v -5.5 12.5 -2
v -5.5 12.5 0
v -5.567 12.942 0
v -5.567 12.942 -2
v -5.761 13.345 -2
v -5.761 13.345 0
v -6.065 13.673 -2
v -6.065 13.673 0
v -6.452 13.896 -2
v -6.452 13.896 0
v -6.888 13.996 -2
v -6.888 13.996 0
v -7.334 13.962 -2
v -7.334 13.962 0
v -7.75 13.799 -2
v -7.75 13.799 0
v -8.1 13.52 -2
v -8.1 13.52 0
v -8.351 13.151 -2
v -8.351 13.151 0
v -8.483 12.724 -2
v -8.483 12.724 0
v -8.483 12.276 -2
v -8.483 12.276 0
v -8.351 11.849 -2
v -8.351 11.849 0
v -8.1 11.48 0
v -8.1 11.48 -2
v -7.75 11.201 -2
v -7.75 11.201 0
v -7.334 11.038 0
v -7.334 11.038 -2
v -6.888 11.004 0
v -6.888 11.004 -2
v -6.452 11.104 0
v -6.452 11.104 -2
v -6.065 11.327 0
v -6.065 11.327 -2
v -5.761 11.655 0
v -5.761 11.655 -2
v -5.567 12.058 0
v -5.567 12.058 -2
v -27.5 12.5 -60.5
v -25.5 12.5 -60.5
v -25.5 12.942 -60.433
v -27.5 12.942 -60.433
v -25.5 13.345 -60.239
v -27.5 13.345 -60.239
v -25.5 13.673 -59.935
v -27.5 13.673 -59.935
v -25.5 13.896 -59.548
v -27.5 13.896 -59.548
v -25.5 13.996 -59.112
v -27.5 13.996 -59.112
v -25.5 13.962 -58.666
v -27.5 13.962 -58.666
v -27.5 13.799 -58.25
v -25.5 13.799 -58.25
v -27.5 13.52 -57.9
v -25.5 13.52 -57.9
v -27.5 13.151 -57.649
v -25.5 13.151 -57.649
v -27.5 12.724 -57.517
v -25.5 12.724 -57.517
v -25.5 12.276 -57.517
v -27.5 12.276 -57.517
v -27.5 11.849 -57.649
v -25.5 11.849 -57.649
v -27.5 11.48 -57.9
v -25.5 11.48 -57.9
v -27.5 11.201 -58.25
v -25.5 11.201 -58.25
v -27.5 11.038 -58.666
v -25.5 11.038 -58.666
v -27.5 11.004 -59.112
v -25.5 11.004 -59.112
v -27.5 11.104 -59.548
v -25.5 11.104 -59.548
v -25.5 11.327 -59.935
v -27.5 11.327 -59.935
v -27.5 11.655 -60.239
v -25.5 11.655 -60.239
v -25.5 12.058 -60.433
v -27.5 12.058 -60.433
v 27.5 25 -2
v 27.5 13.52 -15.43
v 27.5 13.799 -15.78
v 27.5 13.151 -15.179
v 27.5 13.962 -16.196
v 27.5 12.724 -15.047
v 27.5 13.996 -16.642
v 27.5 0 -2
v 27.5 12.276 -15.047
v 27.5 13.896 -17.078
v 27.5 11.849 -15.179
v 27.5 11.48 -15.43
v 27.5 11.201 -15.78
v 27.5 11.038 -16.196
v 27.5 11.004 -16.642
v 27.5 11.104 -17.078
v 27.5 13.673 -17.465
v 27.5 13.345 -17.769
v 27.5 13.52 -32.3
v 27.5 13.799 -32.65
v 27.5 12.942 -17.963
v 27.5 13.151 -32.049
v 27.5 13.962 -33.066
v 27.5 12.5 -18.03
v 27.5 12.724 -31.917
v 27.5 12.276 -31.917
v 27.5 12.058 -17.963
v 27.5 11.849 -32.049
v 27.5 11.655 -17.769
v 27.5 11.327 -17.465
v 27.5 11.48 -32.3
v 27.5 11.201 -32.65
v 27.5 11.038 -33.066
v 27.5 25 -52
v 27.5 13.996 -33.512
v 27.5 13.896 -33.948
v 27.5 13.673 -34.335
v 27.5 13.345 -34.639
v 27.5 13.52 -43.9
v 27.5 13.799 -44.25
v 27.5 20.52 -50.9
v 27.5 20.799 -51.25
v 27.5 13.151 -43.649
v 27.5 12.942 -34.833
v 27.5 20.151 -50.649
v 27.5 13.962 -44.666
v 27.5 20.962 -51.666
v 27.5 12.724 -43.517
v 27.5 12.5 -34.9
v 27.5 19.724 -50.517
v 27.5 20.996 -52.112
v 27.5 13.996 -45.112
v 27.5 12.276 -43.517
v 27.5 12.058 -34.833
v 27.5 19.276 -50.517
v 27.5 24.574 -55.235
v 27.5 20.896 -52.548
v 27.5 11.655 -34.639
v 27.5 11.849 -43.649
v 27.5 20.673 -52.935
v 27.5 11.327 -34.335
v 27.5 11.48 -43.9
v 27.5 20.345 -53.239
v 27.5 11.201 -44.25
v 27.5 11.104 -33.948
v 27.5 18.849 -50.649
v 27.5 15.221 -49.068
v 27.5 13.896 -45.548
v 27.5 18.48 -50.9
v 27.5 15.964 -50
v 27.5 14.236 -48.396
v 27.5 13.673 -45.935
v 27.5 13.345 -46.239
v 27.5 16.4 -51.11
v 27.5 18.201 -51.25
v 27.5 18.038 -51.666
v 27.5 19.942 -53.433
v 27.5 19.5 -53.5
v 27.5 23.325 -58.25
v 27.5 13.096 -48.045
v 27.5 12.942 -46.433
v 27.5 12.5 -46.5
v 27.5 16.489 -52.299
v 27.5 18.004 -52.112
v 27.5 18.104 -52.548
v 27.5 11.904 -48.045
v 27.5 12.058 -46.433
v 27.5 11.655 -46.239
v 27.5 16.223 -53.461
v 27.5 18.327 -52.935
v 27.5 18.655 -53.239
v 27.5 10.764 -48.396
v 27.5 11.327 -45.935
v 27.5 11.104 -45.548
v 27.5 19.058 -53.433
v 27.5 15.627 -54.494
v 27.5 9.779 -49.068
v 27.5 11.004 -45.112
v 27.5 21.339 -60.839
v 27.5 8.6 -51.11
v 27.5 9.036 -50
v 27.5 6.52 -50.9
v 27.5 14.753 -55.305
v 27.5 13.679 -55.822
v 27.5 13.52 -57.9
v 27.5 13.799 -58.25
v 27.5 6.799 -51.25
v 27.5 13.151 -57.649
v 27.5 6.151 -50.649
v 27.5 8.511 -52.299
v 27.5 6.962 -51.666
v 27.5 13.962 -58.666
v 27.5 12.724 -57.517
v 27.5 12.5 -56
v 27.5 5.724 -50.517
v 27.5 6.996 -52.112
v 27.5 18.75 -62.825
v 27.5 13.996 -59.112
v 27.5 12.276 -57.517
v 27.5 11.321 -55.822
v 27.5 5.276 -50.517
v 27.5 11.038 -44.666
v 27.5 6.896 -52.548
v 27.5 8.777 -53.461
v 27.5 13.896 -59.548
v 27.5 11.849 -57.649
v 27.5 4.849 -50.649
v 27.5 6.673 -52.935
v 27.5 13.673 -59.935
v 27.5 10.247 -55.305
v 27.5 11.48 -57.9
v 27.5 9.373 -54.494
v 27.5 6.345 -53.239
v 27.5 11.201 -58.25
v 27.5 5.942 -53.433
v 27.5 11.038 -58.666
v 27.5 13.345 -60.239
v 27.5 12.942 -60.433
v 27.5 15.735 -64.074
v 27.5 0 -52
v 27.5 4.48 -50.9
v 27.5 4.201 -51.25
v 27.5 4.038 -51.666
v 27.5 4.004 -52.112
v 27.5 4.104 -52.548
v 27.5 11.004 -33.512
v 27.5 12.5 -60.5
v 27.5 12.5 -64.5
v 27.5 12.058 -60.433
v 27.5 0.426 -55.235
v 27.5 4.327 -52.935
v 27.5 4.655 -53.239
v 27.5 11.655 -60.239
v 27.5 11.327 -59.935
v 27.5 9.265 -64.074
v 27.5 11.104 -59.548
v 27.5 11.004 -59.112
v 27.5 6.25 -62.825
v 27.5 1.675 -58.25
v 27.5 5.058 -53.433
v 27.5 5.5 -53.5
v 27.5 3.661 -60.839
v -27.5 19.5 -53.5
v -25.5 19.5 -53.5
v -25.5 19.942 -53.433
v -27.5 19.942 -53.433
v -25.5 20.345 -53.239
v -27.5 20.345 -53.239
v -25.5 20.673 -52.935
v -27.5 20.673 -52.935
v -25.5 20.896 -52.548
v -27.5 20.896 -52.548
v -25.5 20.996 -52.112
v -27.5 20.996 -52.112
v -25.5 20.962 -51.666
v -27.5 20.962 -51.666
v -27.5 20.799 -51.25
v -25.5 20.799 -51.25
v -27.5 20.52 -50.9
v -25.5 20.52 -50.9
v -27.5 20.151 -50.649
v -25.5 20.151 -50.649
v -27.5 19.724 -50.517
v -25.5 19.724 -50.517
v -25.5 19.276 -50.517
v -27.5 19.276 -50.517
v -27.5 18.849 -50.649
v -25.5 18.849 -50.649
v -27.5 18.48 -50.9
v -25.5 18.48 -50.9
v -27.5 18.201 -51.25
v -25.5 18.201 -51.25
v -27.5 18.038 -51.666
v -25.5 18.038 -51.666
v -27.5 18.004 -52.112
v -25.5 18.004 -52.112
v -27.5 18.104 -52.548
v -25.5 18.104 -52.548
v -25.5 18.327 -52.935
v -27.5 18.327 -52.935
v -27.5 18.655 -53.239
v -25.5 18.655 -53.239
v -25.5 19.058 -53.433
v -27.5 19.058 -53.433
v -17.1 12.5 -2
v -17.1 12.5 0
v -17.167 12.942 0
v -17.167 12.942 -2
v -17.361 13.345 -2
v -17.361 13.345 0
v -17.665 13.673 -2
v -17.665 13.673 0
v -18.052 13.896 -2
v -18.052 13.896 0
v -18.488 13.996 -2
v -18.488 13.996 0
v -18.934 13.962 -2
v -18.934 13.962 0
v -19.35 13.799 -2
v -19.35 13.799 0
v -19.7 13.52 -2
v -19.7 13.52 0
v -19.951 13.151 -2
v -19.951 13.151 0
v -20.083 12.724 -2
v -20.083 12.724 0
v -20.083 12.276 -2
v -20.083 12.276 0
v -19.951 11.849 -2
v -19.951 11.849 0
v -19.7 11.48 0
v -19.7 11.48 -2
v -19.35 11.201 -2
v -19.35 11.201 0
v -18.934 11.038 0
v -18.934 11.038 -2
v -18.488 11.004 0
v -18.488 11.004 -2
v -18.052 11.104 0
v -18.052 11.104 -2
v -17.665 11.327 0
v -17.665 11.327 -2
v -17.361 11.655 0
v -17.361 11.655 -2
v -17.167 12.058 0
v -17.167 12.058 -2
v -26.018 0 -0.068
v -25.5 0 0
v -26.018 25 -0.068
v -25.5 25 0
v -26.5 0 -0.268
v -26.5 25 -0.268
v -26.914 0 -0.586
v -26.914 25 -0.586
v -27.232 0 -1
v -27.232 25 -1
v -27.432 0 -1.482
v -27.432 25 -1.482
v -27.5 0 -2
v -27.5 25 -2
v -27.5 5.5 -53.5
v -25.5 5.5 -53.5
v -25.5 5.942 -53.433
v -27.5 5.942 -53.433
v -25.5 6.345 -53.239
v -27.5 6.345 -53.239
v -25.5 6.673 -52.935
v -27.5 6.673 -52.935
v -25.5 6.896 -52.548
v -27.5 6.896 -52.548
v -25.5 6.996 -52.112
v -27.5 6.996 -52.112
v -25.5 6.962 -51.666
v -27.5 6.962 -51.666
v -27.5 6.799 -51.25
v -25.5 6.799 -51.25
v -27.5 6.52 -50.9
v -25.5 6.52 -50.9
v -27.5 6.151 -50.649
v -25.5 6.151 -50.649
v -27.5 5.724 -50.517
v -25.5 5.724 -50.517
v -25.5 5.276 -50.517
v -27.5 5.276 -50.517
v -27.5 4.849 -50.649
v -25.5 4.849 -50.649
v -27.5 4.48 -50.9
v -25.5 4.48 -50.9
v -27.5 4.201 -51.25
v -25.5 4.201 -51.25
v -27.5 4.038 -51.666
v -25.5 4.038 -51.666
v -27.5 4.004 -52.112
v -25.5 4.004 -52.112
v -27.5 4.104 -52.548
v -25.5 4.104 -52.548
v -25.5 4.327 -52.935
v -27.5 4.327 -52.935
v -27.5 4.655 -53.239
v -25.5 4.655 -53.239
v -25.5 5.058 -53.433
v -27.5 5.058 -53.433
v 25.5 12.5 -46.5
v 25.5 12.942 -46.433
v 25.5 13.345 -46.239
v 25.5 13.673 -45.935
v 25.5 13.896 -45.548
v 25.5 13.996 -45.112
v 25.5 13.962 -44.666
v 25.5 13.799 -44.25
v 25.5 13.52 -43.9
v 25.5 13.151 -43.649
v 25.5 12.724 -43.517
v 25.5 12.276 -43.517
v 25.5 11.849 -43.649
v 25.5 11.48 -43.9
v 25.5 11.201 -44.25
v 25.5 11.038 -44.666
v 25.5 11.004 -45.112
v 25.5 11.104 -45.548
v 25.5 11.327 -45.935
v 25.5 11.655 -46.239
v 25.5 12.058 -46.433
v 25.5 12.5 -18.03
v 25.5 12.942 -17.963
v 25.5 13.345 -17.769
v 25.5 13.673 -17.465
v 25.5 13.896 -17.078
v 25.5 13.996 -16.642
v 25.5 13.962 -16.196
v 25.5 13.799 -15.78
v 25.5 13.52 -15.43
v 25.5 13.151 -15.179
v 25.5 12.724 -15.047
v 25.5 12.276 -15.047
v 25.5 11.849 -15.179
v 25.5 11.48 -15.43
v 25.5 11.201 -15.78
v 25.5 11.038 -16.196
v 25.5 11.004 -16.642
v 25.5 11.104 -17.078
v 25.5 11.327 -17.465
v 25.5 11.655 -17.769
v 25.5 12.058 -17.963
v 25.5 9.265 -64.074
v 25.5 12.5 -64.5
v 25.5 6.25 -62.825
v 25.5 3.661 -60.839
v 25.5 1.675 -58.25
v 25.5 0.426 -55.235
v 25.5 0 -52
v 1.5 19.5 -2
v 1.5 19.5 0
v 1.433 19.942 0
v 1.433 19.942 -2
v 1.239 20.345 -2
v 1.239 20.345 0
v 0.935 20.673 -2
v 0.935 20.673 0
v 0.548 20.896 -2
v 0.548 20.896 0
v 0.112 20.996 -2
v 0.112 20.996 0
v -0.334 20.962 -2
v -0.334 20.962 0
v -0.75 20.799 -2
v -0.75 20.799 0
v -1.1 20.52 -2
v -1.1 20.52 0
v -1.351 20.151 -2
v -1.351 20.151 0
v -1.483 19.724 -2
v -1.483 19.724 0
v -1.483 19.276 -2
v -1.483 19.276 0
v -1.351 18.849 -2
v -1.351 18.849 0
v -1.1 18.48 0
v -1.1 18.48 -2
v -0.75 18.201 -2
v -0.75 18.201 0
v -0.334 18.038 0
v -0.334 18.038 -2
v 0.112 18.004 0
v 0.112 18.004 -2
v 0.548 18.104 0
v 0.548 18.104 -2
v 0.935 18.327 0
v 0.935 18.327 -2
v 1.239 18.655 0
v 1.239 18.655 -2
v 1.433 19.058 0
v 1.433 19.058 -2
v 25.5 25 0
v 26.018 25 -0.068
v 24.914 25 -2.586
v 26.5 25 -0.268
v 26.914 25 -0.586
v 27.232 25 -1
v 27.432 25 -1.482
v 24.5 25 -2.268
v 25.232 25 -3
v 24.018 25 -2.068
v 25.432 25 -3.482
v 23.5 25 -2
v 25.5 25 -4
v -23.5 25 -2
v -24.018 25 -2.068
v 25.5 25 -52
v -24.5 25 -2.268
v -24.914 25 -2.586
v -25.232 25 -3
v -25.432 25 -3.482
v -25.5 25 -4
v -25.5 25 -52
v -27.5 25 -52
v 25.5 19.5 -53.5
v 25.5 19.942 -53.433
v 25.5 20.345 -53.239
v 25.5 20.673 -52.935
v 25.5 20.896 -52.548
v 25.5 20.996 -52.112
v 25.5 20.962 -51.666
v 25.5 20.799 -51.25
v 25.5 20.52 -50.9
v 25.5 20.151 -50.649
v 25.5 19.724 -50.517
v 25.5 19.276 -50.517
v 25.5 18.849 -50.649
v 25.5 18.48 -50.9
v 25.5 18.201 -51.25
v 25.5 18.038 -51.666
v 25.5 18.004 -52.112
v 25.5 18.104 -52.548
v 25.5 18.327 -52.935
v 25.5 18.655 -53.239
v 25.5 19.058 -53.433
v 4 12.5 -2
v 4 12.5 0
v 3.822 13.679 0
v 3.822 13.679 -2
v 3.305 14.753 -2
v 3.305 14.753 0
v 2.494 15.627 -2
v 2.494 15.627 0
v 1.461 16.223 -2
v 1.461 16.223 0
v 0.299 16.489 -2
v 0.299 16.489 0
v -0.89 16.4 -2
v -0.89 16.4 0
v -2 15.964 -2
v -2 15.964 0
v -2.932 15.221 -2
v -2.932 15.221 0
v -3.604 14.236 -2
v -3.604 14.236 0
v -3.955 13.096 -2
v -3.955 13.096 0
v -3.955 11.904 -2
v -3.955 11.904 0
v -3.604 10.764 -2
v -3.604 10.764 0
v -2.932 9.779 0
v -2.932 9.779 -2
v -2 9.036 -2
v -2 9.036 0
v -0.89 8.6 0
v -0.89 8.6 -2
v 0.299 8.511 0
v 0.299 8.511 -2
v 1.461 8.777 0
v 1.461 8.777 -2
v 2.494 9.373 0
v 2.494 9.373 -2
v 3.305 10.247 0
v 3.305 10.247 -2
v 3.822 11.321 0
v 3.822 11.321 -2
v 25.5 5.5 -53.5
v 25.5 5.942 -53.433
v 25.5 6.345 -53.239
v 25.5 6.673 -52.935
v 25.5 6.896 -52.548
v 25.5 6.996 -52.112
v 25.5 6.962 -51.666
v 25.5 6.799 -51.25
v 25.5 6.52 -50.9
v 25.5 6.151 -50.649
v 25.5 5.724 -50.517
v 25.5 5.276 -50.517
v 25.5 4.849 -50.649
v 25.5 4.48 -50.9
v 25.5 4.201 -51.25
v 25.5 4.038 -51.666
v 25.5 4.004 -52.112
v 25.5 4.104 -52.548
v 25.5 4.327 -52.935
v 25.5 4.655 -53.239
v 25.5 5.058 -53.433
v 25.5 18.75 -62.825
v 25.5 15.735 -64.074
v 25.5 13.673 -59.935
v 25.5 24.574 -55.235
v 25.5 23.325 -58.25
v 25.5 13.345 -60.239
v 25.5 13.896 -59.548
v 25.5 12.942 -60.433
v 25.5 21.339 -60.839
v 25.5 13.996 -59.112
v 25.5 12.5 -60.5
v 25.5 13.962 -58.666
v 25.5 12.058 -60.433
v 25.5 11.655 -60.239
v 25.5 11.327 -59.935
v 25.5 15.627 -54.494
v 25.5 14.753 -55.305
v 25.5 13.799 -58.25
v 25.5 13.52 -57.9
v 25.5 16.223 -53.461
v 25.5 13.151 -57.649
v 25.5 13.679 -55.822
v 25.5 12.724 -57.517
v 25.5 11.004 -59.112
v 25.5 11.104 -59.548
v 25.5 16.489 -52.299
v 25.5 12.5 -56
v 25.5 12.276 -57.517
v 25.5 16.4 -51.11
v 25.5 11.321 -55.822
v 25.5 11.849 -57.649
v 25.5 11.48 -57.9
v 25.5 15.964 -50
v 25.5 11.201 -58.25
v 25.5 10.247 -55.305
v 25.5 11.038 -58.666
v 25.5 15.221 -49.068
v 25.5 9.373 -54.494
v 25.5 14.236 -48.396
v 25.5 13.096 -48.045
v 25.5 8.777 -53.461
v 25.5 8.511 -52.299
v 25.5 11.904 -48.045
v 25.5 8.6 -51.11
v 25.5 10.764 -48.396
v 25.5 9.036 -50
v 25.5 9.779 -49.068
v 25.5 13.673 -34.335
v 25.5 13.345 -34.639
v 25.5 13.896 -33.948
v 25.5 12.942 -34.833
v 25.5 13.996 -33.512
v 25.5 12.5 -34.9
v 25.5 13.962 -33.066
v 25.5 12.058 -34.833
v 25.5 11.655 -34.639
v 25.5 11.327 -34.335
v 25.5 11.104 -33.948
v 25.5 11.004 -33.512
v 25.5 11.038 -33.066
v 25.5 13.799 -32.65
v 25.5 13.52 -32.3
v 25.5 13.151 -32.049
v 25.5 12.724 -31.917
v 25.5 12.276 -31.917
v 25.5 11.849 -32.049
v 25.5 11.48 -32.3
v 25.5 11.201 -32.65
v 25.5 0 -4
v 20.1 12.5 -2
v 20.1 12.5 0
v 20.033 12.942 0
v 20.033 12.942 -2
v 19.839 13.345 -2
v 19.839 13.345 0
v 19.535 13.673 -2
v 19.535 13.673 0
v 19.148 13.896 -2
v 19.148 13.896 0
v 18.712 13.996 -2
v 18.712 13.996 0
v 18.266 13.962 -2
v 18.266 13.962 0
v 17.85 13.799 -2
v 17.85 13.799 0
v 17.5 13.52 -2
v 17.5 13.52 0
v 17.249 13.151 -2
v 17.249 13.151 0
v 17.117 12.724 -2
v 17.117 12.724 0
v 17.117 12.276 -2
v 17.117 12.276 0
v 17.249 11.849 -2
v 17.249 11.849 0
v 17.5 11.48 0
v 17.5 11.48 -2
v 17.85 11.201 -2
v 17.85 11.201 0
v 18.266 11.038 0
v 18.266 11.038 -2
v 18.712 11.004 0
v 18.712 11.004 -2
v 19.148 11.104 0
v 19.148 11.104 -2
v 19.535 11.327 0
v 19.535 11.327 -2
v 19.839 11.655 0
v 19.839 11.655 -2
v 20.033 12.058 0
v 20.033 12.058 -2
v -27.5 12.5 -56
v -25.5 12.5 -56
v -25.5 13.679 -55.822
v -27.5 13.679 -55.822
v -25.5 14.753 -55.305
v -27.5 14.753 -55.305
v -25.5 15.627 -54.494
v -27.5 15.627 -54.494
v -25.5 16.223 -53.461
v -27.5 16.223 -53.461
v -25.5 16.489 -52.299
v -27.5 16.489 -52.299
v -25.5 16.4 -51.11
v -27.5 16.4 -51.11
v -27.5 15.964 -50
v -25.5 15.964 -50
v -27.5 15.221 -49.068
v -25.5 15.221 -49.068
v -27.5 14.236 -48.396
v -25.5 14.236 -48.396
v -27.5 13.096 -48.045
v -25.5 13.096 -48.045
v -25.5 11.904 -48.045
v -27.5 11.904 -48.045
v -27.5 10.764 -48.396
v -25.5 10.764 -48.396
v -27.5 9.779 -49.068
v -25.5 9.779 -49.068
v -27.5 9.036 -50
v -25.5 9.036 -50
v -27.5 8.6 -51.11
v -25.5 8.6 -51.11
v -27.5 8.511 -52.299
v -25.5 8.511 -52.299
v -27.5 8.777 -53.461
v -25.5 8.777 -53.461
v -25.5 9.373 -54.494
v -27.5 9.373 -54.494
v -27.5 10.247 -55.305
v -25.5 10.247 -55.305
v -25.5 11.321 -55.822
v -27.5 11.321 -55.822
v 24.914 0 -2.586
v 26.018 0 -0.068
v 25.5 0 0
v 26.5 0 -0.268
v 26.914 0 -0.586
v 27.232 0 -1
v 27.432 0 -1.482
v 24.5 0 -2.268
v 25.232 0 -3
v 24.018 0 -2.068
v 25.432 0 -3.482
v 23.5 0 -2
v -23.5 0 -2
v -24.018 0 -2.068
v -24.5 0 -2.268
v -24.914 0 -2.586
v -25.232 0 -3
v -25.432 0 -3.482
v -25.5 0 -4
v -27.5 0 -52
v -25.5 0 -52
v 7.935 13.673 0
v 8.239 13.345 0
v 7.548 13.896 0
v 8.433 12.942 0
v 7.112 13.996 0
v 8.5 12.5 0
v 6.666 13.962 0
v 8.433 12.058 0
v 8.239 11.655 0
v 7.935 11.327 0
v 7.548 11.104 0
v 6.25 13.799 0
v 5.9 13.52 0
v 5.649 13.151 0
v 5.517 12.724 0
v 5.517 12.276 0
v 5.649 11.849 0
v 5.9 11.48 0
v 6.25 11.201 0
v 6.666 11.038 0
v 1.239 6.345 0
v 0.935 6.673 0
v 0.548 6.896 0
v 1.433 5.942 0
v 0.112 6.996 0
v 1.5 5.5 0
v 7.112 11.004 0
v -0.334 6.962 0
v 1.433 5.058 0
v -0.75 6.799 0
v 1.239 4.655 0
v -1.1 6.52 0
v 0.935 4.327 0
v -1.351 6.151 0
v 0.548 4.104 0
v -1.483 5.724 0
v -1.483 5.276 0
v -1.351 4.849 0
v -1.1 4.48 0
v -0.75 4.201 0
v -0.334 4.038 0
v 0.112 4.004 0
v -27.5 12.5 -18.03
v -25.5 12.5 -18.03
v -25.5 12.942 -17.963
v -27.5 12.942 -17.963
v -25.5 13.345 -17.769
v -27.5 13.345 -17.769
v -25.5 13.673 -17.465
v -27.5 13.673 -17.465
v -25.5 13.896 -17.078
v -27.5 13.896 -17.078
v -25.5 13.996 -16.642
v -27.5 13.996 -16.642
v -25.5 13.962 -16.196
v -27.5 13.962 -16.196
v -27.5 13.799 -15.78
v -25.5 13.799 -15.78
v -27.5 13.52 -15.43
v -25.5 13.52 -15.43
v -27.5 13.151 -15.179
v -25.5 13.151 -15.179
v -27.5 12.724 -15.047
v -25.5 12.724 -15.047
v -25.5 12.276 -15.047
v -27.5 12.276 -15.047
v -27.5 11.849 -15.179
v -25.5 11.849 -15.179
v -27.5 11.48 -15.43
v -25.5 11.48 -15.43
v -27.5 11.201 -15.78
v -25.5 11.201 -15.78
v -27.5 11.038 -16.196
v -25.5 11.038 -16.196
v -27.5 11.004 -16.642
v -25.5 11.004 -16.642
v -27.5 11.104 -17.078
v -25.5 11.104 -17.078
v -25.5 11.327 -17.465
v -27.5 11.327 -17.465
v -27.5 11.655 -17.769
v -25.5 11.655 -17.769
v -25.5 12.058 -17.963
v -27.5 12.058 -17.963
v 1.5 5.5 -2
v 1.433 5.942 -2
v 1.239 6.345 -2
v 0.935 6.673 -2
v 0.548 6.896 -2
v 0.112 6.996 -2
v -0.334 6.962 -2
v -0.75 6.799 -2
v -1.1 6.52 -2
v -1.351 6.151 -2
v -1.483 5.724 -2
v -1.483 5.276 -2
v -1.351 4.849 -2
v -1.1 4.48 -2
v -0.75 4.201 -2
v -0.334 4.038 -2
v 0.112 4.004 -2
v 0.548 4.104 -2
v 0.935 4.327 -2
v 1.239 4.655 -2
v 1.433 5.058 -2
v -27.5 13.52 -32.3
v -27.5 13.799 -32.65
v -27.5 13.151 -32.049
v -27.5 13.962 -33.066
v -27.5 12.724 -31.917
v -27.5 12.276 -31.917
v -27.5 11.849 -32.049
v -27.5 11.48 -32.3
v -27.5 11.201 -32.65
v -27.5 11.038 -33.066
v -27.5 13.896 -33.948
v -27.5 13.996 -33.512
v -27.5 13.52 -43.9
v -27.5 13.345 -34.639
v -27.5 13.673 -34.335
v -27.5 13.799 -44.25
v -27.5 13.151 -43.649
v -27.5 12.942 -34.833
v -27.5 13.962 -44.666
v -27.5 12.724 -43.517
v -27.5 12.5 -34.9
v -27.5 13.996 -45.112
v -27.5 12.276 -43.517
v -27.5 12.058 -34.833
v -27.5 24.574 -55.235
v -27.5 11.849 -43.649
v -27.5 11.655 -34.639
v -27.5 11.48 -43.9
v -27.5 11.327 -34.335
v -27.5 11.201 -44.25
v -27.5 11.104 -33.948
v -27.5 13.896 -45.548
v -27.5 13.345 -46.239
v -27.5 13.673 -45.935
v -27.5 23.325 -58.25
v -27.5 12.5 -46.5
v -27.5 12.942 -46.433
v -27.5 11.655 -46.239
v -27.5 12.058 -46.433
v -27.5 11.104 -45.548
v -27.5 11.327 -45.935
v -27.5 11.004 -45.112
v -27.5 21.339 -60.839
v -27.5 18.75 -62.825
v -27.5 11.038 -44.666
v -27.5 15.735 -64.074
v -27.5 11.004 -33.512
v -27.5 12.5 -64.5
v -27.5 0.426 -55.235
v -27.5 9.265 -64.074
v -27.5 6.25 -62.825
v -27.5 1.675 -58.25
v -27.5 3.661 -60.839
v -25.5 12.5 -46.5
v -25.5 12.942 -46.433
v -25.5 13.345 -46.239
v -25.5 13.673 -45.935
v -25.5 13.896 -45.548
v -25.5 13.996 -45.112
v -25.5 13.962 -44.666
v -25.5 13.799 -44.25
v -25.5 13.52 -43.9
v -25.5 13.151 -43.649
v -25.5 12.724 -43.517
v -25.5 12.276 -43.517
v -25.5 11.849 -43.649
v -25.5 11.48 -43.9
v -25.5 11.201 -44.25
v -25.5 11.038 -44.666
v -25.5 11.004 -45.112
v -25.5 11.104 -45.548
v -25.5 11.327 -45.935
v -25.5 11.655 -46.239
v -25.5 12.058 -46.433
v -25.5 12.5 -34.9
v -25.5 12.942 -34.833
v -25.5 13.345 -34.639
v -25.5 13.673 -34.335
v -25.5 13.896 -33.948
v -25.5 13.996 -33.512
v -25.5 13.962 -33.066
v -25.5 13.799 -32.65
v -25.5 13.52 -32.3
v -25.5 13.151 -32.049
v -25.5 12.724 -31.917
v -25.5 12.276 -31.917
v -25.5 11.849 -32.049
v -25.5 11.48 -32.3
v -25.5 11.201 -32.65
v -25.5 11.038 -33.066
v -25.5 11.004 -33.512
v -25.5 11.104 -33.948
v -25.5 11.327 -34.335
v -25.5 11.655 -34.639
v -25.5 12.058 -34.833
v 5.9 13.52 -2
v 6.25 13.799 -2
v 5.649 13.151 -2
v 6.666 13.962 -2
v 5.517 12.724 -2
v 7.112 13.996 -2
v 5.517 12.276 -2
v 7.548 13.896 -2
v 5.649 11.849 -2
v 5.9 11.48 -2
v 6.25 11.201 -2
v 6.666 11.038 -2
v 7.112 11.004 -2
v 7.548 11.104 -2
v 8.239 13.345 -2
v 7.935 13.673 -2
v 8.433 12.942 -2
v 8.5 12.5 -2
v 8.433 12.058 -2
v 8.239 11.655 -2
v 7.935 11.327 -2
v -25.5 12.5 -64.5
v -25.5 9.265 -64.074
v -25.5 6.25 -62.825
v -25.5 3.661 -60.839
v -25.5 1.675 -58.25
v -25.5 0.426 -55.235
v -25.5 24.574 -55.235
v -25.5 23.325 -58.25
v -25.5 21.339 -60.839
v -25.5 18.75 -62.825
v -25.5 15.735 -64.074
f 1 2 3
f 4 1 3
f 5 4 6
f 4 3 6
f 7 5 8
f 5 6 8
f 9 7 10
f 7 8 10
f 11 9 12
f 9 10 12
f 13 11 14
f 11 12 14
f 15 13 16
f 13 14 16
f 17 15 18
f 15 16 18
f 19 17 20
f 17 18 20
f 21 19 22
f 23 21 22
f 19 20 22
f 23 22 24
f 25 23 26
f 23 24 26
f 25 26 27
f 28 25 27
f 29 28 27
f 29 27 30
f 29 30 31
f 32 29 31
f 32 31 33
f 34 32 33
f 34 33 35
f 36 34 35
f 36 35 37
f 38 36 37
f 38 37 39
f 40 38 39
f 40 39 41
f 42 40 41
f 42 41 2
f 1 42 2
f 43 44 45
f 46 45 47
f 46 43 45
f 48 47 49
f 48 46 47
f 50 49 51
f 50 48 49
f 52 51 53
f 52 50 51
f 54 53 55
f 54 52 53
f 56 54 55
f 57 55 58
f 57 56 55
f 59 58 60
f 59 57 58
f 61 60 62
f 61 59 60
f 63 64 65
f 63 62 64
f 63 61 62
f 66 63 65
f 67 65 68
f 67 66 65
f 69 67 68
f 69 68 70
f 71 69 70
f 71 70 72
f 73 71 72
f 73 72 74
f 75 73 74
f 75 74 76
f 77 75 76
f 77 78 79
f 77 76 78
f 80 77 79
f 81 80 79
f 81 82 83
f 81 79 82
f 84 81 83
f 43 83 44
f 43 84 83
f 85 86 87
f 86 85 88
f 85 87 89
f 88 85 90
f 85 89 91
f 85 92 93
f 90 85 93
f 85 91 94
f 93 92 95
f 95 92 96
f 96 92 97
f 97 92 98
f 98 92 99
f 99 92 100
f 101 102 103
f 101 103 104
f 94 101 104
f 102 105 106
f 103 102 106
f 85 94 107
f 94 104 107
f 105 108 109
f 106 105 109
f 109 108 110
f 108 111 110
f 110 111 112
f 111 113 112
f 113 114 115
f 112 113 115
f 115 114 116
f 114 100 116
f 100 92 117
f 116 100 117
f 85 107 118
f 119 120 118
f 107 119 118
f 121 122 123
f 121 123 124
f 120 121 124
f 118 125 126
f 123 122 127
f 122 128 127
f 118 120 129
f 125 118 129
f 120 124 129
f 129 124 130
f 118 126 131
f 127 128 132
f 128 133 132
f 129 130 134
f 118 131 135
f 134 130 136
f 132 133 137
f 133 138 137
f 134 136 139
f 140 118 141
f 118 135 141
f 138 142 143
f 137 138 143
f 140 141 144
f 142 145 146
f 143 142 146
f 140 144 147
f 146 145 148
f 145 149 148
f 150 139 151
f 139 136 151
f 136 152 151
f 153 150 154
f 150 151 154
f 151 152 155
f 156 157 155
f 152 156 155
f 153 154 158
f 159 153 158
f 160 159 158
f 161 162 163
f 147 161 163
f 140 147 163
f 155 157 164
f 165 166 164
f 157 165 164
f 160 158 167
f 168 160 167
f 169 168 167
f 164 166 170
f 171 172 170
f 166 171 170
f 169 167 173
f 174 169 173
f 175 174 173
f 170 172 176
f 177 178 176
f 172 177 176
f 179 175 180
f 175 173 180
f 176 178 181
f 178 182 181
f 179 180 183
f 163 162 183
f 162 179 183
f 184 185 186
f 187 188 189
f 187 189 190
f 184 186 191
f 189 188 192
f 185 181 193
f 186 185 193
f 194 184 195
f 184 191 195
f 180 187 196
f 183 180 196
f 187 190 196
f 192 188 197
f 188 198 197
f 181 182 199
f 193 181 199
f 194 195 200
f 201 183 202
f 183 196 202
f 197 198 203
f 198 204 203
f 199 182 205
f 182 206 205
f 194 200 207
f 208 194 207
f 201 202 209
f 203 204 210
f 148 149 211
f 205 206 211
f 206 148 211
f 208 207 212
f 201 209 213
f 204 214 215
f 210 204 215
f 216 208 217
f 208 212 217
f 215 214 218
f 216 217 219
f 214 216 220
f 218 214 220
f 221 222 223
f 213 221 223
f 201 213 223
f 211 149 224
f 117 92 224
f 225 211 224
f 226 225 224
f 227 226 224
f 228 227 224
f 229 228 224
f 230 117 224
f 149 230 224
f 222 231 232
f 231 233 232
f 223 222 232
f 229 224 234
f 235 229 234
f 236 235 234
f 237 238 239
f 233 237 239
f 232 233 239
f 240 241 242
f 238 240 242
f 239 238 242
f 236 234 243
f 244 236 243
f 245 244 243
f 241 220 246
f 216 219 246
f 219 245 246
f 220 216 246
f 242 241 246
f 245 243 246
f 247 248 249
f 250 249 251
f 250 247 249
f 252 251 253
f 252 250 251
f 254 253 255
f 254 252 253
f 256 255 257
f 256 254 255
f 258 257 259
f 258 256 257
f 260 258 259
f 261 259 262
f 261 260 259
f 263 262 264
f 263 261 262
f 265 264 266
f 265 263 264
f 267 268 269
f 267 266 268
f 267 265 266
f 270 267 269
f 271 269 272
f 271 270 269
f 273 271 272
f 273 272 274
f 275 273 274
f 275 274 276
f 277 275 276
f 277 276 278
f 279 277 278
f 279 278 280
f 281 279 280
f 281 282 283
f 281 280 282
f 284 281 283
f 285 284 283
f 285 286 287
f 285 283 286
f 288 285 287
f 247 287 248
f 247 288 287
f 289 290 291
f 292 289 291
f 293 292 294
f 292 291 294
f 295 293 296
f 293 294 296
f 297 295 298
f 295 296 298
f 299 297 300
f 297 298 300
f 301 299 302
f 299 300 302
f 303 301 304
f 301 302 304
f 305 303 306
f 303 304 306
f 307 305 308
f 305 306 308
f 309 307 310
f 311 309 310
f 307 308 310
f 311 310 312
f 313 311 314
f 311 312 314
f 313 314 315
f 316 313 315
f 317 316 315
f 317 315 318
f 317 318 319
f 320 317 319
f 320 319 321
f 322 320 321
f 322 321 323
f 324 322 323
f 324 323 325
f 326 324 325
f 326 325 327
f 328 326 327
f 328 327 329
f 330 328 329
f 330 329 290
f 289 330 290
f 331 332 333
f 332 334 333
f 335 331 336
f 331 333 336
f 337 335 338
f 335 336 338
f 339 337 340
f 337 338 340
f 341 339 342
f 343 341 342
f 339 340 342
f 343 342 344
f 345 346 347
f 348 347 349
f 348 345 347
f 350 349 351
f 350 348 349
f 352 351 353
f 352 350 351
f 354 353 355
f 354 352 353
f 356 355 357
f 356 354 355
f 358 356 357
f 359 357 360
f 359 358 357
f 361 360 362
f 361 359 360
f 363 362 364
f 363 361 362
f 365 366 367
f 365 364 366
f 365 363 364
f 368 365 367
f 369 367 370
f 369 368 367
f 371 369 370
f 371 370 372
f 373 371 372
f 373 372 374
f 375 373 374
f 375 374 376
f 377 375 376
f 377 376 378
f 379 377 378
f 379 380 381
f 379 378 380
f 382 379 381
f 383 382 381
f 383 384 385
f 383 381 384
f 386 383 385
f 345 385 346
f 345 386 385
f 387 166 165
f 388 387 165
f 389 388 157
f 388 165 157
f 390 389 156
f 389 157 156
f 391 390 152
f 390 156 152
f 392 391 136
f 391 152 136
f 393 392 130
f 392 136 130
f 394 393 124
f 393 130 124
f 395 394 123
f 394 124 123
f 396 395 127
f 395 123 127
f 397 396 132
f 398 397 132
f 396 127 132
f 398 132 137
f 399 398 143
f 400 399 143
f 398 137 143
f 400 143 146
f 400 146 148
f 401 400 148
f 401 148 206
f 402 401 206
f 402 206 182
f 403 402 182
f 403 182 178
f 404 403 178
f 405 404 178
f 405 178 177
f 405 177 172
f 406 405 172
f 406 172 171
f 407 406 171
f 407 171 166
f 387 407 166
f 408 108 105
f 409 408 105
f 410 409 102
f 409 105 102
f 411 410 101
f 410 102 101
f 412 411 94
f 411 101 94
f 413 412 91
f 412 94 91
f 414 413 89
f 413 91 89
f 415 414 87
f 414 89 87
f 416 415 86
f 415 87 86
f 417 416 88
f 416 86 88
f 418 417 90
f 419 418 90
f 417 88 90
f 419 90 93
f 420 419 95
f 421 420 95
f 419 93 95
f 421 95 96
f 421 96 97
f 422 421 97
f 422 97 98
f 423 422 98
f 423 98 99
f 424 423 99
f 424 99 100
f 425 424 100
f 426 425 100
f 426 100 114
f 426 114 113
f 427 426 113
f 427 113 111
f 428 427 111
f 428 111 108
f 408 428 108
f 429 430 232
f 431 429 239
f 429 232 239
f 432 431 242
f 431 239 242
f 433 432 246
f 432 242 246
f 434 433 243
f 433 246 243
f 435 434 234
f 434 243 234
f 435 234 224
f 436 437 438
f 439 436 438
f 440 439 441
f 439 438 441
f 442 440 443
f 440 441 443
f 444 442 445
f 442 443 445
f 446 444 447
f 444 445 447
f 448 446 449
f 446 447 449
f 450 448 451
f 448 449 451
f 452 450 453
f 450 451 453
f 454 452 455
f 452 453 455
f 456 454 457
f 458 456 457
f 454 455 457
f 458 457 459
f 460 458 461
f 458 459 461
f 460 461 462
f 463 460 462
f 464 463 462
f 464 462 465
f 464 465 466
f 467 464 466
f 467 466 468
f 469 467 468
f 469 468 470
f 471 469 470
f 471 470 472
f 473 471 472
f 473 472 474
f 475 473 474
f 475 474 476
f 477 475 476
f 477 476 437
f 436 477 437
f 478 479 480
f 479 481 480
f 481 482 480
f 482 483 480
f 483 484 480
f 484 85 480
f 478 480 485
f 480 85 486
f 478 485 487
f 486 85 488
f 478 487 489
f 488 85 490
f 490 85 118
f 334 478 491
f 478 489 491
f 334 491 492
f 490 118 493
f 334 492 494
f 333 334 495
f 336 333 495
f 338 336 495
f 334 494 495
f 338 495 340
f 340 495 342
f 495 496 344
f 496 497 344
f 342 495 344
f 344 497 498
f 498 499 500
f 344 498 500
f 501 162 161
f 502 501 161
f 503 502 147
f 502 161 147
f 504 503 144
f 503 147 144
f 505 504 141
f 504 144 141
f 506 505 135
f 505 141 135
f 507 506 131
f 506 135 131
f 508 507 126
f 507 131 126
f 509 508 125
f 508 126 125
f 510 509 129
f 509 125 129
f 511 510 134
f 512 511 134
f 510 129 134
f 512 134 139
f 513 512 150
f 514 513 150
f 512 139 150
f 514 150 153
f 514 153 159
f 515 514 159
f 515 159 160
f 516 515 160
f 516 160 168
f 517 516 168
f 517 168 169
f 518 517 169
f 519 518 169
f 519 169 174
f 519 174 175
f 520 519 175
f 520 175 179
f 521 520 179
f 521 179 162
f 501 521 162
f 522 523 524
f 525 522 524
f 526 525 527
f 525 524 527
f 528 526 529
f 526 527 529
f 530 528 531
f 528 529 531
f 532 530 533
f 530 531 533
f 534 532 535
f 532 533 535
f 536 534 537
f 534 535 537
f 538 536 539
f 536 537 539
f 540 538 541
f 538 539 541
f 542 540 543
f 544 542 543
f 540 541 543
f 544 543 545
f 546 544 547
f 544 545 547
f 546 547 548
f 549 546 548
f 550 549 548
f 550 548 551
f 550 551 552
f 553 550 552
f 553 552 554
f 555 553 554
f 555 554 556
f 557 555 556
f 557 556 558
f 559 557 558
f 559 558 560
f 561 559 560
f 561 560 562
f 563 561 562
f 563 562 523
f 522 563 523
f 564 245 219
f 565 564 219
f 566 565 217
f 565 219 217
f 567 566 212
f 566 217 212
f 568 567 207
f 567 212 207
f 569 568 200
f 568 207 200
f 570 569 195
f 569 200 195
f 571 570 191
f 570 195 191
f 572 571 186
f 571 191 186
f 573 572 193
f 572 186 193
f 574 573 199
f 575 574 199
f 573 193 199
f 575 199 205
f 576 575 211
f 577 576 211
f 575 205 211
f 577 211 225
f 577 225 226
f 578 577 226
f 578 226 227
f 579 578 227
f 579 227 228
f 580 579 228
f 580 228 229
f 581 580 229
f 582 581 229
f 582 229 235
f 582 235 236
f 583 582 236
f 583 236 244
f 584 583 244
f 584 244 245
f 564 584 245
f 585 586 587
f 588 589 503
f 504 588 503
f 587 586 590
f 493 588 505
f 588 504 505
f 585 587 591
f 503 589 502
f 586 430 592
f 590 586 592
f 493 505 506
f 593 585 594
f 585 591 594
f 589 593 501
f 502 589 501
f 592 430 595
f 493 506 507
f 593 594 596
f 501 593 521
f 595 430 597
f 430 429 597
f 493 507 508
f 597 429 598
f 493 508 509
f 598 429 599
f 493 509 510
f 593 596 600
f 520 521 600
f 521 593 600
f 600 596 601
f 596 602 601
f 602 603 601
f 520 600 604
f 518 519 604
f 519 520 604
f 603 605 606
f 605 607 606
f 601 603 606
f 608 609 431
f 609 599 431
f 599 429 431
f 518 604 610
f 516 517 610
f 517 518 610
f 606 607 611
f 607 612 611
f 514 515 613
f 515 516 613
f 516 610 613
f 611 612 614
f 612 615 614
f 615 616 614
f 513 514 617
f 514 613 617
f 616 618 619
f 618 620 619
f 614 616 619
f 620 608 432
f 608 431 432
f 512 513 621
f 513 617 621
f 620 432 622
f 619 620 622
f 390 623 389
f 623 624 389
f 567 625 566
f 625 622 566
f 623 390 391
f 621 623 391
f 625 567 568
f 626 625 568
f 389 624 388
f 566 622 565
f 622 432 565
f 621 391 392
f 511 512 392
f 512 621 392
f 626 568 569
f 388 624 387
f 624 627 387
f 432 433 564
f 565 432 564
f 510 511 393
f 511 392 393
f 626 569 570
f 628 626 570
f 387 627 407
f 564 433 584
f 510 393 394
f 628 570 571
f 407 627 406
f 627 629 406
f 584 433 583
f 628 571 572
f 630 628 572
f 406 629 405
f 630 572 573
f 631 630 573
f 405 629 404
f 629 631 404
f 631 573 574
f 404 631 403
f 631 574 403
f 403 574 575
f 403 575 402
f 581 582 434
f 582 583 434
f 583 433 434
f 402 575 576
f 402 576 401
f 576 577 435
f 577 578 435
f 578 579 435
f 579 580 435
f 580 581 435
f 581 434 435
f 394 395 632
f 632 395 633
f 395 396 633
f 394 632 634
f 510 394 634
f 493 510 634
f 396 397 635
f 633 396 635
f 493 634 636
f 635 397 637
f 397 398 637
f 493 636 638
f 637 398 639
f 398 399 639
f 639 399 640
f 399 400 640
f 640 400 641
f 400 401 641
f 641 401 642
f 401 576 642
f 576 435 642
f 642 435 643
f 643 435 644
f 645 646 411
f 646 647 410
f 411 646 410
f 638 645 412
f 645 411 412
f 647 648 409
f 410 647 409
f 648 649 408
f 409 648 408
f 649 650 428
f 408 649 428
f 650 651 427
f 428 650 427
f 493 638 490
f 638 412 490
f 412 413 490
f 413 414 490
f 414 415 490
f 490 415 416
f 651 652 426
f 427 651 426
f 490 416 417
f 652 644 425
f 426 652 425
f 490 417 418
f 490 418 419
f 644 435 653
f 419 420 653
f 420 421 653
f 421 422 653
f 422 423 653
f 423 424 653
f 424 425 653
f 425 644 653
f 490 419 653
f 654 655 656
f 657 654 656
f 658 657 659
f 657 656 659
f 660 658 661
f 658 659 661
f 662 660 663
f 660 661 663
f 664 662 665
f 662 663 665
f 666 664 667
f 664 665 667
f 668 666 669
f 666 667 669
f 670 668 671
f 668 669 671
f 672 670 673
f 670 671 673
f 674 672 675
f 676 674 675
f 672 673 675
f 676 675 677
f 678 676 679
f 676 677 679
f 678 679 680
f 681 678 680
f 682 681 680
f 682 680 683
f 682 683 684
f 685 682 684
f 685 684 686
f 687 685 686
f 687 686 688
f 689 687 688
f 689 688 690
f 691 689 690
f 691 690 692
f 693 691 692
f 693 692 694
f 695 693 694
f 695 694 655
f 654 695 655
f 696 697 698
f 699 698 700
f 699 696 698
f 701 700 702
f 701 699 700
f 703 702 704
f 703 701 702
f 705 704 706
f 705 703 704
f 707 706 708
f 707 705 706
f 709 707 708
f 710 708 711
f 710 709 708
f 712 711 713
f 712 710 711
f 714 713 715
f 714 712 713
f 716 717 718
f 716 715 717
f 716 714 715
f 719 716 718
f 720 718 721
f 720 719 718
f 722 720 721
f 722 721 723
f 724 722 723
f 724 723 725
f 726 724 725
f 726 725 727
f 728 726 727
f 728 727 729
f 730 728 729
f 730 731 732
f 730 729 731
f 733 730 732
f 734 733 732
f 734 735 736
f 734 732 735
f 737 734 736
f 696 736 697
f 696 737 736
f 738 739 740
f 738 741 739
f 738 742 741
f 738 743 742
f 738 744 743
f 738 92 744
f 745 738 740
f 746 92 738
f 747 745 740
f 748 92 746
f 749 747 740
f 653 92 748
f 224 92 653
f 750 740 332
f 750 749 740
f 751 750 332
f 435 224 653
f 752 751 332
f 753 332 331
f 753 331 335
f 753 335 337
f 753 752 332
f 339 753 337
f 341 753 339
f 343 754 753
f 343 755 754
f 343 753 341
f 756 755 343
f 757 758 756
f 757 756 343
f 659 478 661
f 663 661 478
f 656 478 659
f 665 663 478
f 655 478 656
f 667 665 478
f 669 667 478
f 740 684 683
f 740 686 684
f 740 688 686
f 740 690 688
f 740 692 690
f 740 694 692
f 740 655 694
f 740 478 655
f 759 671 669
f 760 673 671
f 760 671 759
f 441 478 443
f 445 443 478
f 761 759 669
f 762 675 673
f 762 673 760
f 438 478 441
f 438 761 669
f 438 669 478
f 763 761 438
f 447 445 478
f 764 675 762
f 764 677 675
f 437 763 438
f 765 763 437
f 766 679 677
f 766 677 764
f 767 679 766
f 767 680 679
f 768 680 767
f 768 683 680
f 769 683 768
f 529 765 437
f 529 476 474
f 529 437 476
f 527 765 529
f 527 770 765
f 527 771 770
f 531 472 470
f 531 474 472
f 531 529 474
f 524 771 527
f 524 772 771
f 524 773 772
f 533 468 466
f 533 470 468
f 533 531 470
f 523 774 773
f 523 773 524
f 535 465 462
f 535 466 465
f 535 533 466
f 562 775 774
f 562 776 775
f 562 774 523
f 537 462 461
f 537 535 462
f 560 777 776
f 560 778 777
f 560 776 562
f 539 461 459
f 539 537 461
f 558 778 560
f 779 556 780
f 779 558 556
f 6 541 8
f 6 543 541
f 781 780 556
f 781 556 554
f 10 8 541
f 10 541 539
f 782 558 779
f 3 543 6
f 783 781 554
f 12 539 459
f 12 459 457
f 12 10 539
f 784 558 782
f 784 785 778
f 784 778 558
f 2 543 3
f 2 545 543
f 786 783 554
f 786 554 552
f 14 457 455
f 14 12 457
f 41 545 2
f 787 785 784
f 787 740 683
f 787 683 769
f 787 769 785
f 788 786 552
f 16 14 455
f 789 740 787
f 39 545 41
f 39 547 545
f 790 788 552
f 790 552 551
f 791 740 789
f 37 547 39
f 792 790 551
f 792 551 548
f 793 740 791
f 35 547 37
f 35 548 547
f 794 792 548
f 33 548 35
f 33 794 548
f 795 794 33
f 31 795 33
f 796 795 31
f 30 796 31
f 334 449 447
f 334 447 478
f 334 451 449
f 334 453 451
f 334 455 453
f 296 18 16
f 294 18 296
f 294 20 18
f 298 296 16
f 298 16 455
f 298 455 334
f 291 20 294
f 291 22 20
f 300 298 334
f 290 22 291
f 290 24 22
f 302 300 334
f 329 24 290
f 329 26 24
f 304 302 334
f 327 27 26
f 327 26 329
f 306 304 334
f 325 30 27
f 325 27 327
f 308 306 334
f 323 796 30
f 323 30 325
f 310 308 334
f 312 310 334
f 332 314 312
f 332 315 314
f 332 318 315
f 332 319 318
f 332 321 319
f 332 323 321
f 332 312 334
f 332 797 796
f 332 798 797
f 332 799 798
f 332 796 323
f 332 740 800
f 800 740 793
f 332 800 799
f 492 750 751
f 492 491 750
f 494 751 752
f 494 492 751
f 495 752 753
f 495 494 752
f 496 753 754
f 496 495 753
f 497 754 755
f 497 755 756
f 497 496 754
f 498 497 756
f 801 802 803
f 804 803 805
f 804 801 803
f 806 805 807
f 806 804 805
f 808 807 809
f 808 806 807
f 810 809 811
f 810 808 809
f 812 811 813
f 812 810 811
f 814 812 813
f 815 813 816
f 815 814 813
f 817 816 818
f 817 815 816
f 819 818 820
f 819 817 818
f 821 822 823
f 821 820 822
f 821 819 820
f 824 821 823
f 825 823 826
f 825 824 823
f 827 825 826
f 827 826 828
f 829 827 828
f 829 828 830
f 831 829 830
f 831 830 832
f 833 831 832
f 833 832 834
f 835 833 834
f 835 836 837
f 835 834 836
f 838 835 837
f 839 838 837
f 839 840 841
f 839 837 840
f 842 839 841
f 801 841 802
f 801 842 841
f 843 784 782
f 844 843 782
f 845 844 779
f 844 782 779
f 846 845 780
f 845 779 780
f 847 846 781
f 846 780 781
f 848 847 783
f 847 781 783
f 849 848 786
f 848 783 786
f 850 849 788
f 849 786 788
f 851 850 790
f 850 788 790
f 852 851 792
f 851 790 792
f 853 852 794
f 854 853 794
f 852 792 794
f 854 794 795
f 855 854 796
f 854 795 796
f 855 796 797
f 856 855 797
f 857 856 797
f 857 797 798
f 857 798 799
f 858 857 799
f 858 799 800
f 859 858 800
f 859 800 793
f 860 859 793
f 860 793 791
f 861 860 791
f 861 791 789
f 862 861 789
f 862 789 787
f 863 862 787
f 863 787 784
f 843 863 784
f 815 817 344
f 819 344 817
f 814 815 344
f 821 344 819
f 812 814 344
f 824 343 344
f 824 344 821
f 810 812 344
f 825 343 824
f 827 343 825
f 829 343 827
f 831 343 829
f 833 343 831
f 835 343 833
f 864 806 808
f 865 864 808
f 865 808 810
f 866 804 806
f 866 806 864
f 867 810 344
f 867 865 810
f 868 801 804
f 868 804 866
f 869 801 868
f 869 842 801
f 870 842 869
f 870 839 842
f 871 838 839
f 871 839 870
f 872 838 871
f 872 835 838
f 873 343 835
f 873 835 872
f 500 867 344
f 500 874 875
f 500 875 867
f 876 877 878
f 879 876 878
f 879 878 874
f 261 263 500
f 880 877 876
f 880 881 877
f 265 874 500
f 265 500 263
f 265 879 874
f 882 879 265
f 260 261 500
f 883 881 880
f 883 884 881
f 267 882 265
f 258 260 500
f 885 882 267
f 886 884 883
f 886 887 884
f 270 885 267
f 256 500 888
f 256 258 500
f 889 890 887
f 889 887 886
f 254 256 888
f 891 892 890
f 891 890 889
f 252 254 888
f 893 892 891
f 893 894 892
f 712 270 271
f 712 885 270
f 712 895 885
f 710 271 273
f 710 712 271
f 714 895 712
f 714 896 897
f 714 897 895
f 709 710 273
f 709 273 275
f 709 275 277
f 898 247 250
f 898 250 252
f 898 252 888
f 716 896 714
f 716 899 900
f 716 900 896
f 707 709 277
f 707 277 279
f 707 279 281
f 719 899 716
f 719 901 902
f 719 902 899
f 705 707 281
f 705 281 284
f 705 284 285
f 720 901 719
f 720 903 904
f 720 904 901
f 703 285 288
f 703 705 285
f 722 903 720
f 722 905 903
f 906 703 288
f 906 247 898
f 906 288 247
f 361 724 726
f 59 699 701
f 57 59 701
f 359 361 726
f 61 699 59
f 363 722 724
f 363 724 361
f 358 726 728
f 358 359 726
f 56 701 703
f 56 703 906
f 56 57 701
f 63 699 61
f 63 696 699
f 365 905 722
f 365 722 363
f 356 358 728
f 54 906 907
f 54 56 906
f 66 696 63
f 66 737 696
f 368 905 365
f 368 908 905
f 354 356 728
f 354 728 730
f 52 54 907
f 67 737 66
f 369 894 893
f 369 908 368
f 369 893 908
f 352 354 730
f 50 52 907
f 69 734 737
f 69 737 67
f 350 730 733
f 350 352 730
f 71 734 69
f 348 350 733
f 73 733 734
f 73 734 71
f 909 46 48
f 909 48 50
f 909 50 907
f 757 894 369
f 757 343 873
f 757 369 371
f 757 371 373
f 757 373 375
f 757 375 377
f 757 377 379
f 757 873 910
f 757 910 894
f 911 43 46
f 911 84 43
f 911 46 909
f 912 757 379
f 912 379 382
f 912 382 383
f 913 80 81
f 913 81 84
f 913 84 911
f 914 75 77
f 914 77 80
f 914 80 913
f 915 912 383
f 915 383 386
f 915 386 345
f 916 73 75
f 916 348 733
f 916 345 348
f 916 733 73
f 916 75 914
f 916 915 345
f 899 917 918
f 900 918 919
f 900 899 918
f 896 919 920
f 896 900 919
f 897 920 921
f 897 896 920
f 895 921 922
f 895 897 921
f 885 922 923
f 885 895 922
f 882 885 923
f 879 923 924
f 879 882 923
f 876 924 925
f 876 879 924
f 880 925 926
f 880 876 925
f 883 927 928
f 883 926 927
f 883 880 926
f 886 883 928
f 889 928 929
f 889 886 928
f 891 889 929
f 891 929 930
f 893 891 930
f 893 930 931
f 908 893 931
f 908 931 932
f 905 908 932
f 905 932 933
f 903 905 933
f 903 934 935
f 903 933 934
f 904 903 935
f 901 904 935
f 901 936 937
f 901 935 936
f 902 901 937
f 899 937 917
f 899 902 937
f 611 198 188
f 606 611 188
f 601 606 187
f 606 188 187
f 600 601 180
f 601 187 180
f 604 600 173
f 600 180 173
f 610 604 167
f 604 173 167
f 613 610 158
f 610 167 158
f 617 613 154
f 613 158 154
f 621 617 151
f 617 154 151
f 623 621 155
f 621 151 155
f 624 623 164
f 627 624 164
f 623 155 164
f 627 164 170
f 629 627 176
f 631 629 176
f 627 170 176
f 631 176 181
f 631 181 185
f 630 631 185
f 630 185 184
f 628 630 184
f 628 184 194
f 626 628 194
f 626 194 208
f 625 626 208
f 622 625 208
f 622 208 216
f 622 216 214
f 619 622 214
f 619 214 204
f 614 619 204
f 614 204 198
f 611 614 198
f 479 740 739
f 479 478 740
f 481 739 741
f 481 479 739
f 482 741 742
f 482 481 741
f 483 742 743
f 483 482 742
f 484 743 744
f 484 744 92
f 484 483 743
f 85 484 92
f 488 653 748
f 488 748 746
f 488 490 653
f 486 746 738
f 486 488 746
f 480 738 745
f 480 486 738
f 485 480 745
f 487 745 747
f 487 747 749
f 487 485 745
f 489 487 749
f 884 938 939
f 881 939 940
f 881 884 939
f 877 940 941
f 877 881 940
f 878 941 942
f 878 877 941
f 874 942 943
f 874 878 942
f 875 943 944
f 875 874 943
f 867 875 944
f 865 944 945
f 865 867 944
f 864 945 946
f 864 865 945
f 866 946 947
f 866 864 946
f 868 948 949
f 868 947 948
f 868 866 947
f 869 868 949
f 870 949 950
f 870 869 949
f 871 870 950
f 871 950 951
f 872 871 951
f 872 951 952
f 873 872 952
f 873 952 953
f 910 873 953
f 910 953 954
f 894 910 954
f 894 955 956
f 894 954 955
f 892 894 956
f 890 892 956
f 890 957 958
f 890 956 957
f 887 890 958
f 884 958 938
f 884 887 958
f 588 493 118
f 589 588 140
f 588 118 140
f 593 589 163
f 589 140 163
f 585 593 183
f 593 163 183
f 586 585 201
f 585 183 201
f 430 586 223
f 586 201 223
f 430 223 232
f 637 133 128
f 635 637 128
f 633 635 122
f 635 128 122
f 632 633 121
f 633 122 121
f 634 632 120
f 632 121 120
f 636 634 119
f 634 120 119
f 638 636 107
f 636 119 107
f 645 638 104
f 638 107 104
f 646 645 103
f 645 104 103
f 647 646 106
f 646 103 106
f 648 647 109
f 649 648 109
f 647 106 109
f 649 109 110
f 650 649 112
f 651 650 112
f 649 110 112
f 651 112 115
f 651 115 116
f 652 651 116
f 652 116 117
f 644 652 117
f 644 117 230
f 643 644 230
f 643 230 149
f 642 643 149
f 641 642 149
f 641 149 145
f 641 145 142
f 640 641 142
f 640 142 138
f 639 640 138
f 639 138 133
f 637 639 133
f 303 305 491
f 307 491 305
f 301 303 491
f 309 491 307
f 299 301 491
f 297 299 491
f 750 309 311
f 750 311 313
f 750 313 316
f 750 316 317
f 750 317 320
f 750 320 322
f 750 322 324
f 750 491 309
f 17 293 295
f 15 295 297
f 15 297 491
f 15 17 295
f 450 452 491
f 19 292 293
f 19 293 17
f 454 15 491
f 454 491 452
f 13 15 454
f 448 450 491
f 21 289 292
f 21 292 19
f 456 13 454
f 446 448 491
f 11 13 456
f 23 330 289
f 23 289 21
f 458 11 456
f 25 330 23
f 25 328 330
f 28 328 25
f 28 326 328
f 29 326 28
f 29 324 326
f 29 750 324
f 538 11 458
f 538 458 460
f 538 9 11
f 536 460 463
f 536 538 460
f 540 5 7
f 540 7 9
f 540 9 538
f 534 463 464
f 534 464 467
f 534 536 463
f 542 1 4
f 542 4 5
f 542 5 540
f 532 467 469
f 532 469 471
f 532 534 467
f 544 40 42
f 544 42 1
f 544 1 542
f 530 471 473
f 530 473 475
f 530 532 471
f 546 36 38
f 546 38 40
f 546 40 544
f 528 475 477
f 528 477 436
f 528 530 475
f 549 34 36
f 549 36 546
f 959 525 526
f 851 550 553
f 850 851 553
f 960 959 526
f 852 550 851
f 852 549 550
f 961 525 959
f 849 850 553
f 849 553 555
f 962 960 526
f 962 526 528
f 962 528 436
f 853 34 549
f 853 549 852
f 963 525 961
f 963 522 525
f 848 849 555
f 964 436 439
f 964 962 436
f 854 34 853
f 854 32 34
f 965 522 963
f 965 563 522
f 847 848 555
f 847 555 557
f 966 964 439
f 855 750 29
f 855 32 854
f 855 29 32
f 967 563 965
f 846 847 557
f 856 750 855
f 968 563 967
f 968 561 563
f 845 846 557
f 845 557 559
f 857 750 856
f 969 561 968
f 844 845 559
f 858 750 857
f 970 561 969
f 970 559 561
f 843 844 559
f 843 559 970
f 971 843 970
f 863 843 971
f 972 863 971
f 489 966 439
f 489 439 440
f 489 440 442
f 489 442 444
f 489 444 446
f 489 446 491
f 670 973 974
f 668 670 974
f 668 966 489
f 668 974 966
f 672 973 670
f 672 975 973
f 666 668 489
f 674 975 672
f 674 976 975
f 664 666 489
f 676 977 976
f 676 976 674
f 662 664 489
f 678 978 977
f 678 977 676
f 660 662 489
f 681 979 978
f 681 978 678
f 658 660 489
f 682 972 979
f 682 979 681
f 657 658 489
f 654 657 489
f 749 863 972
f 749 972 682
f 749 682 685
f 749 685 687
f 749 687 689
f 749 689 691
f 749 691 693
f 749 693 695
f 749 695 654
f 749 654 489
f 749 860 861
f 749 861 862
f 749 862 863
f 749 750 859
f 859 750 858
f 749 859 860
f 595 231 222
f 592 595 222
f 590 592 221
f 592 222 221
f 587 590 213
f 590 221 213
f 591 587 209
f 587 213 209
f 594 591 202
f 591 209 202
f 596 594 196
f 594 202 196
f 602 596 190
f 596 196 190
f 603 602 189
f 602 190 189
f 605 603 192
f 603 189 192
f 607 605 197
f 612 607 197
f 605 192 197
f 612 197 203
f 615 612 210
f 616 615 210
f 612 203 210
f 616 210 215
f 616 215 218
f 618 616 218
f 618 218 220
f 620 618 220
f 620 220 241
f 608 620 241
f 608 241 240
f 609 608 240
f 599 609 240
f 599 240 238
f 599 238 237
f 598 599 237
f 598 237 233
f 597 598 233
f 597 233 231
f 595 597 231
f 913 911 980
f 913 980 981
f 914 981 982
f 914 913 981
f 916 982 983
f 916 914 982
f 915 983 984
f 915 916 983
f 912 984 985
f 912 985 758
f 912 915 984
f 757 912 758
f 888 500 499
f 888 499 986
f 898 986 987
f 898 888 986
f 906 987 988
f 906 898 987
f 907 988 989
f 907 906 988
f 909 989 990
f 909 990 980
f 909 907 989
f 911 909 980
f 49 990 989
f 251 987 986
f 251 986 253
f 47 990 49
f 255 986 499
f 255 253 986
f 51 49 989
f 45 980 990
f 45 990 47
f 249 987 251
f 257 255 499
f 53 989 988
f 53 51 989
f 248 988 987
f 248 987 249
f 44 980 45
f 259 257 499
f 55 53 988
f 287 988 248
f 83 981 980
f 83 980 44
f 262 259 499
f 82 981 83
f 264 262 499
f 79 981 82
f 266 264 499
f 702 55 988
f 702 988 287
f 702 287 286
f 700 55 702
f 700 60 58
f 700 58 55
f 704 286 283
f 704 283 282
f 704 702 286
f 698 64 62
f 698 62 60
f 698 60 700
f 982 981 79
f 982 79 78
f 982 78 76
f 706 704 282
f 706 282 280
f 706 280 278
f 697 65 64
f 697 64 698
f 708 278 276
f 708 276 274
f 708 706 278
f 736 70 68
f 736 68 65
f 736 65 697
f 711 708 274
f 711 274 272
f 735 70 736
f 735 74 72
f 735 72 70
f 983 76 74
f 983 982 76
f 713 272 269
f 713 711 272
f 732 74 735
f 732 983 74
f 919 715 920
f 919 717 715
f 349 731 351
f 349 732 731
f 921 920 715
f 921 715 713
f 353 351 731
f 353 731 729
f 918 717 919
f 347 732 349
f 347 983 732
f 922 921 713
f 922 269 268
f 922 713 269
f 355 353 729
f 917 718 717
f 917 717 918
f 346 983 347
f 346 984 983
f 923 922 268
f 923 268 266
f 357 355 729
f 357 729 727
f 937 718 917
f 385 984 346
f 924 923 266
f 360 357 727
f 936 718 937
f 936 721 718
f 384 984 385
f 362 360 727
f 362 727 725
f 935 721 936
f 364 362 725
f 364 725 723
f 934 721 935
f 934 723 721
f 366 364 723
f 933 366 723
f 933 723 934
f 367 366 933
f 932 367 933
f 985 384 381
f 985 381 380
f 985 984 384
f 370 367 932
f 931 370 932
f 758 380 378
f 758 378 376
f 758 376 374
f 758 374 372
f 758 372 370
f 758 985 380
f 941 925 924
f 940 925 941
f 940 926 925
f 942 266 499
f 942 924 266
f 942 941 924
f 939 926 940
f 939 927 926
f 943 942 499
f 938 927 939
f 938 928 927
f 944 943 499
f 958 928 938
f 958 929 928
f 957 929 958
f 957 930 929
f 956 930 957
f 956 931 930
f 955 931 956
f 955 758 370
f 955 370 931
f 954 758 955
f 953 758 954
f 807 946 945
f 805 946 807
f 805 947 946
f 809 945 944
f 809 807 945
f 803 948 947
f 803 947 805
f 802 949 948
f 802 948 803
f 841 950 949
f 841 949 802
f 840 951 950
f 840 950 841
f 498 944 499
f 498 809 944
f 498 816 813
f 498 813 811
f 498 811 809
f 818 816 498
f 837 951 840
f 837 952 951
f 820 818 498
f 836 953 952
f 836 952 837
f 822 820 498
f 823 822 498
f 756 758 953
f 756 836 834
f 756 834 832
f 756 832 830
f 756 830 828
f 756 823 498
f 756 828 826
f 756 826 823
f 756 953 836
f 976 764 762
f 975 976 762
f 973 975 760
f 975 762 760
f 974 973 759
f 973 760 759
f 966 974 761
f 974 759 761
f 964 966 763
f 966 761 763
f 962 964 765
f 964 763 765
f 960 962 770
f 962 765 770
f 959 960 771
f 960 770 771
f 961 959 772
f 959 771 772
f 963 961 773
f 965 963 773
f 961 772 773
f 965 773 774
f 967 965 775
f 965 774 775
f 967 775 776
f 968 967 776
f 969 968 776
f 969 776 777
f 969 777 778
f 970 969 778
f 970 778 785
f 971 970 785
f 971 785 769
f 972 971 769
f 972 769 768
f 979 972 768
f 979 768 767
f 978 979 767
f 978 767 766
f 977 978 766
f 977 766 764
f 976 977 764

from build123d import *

# Parameters (mm, degrees)
EXTRUDE_1_DEPTH     = 25
SKETCH_2_R          = 1.5
SKETCH_2_R_2        = 4
CUT_EXTRUDE_1_DEPTH = 25
SKETCH_3_R          = 1.5
SKETCH_3_R_2        = 4
CUT_EXTRUDE_2_DEPTH = 25
FILLET_1_R          = 2


with BuildPart() as part:
    # 草图1 → 凸台-拉伸1 (new body)
    with BuildSketch(Plane(origin=(0, 0, 0), x_dir=(1, 0, 0), z_dir=(0, 1, 0))):
        Polygon((0, 0), (27.5, 0), (27.5, 64.5), (25.5, 64.5), (25.5, 2), (0, 2), align=None)
    extrude_1 = extrude(amount=EXTRUDE_1_DEPTH)

    # 草图2 → 切除-拉伸1 (cut)
    with BuildSketch(Plane(origin=(27.5, 0, 0), x_dir=(0, 0, -1), z_dir=(1, 0, 0))):
        with Locations((16.53, 12.5)):
            Circle(SKETCH_2_R)
        with Locations((45, 12.5)):
            Circle(SKETCH_2_R)
        with Locations((52, 12.5)):
            Circle(SKETCH_2_R_2)
        with Locations((52, 19.5)):
            Circle(SKETCH_2_R)
        with Locations((59, 12.5)):
            Circle(SKETCH_2_R)
        with Locations((52, 5.5)):
            Circle(SKETCH_2_R)
        with BuildLine():
            Line((64.5, 25), (52, 25))
            ThreePointArc((52, 25), (60.838834765, 21.338834765), (64.5, 12.5))
            Line((64.5, 12.5), (64.5, 25))
        make_face()
        with BuildLine():
            Line((64.5, 0), (64.5, 12.5))
            ThreePointArc((64.5, 12.5), (60.838834765, 3.661165235), (52, 0))
            Line((52, 0), (64.5, 0))
        make_face()
        with Locations((33.4, 12.5)):
            Circle(SKETCH_2_R)
    cut_extrude_1 = extrude(amount=-CUT_EXTRUDE_1_DEPTH, mode=Mode.SUBTRACT)

    # 镜向1: 凸台-拉伸1, 切除-拉伸1 across plane
    add(extrude_1.mirror(Plane(origin=(0, 25, -2), x_dir=(0, 0, 1), z_dir=(1, 0, 0))))
    add(cut_extrude_1.mirror(Plane(origin=(0, 25, -2), x_dir=(0, 0, 1), z_dir=(1, 0, 0))), mode=Mode.SUBTRACT)

    # 草图3 → 切除-拉伸2 (cut)
    with BuildSketch(Plane.XY):
        with Locations((7, 12.5)):
            Circle(SKETCH_3_R)
        with Locations((0, 19.5)):
            Circle(SKETCH_3_R)
        with Locations((-7, 12.5)):
            Circle(SKETCH_3_R)
        with Locations((0, 5.5)):
            Circle(SKETCH_3_R)
        with Locations((18.6, 12.5)):
            Circle(SKETCH_3_R)
        with Locations((-18.6, 12.5)):
            Circle(SKETCH_3_R)
        with Locations((0, 12.5)):
            Circle(SKETCH_3_R_2)
    extrude(amount=-CUT_EXTRUDE_2_DEPTH, mode=Mode.SUBTRACT)

    # 圆角1
    fillet_1_edges = [part.edges().sort_by_distance(p)[0] for p in [
        (25.5, 12.5, -2),
        (27.5, 12.5, 0),
        (-25.5, 12.5, -2),
        (-27.5, 12.5, 0),
    ]]
    fillet(fillet_1_edges, radius=FILLET_1_R)


solid = part.part
